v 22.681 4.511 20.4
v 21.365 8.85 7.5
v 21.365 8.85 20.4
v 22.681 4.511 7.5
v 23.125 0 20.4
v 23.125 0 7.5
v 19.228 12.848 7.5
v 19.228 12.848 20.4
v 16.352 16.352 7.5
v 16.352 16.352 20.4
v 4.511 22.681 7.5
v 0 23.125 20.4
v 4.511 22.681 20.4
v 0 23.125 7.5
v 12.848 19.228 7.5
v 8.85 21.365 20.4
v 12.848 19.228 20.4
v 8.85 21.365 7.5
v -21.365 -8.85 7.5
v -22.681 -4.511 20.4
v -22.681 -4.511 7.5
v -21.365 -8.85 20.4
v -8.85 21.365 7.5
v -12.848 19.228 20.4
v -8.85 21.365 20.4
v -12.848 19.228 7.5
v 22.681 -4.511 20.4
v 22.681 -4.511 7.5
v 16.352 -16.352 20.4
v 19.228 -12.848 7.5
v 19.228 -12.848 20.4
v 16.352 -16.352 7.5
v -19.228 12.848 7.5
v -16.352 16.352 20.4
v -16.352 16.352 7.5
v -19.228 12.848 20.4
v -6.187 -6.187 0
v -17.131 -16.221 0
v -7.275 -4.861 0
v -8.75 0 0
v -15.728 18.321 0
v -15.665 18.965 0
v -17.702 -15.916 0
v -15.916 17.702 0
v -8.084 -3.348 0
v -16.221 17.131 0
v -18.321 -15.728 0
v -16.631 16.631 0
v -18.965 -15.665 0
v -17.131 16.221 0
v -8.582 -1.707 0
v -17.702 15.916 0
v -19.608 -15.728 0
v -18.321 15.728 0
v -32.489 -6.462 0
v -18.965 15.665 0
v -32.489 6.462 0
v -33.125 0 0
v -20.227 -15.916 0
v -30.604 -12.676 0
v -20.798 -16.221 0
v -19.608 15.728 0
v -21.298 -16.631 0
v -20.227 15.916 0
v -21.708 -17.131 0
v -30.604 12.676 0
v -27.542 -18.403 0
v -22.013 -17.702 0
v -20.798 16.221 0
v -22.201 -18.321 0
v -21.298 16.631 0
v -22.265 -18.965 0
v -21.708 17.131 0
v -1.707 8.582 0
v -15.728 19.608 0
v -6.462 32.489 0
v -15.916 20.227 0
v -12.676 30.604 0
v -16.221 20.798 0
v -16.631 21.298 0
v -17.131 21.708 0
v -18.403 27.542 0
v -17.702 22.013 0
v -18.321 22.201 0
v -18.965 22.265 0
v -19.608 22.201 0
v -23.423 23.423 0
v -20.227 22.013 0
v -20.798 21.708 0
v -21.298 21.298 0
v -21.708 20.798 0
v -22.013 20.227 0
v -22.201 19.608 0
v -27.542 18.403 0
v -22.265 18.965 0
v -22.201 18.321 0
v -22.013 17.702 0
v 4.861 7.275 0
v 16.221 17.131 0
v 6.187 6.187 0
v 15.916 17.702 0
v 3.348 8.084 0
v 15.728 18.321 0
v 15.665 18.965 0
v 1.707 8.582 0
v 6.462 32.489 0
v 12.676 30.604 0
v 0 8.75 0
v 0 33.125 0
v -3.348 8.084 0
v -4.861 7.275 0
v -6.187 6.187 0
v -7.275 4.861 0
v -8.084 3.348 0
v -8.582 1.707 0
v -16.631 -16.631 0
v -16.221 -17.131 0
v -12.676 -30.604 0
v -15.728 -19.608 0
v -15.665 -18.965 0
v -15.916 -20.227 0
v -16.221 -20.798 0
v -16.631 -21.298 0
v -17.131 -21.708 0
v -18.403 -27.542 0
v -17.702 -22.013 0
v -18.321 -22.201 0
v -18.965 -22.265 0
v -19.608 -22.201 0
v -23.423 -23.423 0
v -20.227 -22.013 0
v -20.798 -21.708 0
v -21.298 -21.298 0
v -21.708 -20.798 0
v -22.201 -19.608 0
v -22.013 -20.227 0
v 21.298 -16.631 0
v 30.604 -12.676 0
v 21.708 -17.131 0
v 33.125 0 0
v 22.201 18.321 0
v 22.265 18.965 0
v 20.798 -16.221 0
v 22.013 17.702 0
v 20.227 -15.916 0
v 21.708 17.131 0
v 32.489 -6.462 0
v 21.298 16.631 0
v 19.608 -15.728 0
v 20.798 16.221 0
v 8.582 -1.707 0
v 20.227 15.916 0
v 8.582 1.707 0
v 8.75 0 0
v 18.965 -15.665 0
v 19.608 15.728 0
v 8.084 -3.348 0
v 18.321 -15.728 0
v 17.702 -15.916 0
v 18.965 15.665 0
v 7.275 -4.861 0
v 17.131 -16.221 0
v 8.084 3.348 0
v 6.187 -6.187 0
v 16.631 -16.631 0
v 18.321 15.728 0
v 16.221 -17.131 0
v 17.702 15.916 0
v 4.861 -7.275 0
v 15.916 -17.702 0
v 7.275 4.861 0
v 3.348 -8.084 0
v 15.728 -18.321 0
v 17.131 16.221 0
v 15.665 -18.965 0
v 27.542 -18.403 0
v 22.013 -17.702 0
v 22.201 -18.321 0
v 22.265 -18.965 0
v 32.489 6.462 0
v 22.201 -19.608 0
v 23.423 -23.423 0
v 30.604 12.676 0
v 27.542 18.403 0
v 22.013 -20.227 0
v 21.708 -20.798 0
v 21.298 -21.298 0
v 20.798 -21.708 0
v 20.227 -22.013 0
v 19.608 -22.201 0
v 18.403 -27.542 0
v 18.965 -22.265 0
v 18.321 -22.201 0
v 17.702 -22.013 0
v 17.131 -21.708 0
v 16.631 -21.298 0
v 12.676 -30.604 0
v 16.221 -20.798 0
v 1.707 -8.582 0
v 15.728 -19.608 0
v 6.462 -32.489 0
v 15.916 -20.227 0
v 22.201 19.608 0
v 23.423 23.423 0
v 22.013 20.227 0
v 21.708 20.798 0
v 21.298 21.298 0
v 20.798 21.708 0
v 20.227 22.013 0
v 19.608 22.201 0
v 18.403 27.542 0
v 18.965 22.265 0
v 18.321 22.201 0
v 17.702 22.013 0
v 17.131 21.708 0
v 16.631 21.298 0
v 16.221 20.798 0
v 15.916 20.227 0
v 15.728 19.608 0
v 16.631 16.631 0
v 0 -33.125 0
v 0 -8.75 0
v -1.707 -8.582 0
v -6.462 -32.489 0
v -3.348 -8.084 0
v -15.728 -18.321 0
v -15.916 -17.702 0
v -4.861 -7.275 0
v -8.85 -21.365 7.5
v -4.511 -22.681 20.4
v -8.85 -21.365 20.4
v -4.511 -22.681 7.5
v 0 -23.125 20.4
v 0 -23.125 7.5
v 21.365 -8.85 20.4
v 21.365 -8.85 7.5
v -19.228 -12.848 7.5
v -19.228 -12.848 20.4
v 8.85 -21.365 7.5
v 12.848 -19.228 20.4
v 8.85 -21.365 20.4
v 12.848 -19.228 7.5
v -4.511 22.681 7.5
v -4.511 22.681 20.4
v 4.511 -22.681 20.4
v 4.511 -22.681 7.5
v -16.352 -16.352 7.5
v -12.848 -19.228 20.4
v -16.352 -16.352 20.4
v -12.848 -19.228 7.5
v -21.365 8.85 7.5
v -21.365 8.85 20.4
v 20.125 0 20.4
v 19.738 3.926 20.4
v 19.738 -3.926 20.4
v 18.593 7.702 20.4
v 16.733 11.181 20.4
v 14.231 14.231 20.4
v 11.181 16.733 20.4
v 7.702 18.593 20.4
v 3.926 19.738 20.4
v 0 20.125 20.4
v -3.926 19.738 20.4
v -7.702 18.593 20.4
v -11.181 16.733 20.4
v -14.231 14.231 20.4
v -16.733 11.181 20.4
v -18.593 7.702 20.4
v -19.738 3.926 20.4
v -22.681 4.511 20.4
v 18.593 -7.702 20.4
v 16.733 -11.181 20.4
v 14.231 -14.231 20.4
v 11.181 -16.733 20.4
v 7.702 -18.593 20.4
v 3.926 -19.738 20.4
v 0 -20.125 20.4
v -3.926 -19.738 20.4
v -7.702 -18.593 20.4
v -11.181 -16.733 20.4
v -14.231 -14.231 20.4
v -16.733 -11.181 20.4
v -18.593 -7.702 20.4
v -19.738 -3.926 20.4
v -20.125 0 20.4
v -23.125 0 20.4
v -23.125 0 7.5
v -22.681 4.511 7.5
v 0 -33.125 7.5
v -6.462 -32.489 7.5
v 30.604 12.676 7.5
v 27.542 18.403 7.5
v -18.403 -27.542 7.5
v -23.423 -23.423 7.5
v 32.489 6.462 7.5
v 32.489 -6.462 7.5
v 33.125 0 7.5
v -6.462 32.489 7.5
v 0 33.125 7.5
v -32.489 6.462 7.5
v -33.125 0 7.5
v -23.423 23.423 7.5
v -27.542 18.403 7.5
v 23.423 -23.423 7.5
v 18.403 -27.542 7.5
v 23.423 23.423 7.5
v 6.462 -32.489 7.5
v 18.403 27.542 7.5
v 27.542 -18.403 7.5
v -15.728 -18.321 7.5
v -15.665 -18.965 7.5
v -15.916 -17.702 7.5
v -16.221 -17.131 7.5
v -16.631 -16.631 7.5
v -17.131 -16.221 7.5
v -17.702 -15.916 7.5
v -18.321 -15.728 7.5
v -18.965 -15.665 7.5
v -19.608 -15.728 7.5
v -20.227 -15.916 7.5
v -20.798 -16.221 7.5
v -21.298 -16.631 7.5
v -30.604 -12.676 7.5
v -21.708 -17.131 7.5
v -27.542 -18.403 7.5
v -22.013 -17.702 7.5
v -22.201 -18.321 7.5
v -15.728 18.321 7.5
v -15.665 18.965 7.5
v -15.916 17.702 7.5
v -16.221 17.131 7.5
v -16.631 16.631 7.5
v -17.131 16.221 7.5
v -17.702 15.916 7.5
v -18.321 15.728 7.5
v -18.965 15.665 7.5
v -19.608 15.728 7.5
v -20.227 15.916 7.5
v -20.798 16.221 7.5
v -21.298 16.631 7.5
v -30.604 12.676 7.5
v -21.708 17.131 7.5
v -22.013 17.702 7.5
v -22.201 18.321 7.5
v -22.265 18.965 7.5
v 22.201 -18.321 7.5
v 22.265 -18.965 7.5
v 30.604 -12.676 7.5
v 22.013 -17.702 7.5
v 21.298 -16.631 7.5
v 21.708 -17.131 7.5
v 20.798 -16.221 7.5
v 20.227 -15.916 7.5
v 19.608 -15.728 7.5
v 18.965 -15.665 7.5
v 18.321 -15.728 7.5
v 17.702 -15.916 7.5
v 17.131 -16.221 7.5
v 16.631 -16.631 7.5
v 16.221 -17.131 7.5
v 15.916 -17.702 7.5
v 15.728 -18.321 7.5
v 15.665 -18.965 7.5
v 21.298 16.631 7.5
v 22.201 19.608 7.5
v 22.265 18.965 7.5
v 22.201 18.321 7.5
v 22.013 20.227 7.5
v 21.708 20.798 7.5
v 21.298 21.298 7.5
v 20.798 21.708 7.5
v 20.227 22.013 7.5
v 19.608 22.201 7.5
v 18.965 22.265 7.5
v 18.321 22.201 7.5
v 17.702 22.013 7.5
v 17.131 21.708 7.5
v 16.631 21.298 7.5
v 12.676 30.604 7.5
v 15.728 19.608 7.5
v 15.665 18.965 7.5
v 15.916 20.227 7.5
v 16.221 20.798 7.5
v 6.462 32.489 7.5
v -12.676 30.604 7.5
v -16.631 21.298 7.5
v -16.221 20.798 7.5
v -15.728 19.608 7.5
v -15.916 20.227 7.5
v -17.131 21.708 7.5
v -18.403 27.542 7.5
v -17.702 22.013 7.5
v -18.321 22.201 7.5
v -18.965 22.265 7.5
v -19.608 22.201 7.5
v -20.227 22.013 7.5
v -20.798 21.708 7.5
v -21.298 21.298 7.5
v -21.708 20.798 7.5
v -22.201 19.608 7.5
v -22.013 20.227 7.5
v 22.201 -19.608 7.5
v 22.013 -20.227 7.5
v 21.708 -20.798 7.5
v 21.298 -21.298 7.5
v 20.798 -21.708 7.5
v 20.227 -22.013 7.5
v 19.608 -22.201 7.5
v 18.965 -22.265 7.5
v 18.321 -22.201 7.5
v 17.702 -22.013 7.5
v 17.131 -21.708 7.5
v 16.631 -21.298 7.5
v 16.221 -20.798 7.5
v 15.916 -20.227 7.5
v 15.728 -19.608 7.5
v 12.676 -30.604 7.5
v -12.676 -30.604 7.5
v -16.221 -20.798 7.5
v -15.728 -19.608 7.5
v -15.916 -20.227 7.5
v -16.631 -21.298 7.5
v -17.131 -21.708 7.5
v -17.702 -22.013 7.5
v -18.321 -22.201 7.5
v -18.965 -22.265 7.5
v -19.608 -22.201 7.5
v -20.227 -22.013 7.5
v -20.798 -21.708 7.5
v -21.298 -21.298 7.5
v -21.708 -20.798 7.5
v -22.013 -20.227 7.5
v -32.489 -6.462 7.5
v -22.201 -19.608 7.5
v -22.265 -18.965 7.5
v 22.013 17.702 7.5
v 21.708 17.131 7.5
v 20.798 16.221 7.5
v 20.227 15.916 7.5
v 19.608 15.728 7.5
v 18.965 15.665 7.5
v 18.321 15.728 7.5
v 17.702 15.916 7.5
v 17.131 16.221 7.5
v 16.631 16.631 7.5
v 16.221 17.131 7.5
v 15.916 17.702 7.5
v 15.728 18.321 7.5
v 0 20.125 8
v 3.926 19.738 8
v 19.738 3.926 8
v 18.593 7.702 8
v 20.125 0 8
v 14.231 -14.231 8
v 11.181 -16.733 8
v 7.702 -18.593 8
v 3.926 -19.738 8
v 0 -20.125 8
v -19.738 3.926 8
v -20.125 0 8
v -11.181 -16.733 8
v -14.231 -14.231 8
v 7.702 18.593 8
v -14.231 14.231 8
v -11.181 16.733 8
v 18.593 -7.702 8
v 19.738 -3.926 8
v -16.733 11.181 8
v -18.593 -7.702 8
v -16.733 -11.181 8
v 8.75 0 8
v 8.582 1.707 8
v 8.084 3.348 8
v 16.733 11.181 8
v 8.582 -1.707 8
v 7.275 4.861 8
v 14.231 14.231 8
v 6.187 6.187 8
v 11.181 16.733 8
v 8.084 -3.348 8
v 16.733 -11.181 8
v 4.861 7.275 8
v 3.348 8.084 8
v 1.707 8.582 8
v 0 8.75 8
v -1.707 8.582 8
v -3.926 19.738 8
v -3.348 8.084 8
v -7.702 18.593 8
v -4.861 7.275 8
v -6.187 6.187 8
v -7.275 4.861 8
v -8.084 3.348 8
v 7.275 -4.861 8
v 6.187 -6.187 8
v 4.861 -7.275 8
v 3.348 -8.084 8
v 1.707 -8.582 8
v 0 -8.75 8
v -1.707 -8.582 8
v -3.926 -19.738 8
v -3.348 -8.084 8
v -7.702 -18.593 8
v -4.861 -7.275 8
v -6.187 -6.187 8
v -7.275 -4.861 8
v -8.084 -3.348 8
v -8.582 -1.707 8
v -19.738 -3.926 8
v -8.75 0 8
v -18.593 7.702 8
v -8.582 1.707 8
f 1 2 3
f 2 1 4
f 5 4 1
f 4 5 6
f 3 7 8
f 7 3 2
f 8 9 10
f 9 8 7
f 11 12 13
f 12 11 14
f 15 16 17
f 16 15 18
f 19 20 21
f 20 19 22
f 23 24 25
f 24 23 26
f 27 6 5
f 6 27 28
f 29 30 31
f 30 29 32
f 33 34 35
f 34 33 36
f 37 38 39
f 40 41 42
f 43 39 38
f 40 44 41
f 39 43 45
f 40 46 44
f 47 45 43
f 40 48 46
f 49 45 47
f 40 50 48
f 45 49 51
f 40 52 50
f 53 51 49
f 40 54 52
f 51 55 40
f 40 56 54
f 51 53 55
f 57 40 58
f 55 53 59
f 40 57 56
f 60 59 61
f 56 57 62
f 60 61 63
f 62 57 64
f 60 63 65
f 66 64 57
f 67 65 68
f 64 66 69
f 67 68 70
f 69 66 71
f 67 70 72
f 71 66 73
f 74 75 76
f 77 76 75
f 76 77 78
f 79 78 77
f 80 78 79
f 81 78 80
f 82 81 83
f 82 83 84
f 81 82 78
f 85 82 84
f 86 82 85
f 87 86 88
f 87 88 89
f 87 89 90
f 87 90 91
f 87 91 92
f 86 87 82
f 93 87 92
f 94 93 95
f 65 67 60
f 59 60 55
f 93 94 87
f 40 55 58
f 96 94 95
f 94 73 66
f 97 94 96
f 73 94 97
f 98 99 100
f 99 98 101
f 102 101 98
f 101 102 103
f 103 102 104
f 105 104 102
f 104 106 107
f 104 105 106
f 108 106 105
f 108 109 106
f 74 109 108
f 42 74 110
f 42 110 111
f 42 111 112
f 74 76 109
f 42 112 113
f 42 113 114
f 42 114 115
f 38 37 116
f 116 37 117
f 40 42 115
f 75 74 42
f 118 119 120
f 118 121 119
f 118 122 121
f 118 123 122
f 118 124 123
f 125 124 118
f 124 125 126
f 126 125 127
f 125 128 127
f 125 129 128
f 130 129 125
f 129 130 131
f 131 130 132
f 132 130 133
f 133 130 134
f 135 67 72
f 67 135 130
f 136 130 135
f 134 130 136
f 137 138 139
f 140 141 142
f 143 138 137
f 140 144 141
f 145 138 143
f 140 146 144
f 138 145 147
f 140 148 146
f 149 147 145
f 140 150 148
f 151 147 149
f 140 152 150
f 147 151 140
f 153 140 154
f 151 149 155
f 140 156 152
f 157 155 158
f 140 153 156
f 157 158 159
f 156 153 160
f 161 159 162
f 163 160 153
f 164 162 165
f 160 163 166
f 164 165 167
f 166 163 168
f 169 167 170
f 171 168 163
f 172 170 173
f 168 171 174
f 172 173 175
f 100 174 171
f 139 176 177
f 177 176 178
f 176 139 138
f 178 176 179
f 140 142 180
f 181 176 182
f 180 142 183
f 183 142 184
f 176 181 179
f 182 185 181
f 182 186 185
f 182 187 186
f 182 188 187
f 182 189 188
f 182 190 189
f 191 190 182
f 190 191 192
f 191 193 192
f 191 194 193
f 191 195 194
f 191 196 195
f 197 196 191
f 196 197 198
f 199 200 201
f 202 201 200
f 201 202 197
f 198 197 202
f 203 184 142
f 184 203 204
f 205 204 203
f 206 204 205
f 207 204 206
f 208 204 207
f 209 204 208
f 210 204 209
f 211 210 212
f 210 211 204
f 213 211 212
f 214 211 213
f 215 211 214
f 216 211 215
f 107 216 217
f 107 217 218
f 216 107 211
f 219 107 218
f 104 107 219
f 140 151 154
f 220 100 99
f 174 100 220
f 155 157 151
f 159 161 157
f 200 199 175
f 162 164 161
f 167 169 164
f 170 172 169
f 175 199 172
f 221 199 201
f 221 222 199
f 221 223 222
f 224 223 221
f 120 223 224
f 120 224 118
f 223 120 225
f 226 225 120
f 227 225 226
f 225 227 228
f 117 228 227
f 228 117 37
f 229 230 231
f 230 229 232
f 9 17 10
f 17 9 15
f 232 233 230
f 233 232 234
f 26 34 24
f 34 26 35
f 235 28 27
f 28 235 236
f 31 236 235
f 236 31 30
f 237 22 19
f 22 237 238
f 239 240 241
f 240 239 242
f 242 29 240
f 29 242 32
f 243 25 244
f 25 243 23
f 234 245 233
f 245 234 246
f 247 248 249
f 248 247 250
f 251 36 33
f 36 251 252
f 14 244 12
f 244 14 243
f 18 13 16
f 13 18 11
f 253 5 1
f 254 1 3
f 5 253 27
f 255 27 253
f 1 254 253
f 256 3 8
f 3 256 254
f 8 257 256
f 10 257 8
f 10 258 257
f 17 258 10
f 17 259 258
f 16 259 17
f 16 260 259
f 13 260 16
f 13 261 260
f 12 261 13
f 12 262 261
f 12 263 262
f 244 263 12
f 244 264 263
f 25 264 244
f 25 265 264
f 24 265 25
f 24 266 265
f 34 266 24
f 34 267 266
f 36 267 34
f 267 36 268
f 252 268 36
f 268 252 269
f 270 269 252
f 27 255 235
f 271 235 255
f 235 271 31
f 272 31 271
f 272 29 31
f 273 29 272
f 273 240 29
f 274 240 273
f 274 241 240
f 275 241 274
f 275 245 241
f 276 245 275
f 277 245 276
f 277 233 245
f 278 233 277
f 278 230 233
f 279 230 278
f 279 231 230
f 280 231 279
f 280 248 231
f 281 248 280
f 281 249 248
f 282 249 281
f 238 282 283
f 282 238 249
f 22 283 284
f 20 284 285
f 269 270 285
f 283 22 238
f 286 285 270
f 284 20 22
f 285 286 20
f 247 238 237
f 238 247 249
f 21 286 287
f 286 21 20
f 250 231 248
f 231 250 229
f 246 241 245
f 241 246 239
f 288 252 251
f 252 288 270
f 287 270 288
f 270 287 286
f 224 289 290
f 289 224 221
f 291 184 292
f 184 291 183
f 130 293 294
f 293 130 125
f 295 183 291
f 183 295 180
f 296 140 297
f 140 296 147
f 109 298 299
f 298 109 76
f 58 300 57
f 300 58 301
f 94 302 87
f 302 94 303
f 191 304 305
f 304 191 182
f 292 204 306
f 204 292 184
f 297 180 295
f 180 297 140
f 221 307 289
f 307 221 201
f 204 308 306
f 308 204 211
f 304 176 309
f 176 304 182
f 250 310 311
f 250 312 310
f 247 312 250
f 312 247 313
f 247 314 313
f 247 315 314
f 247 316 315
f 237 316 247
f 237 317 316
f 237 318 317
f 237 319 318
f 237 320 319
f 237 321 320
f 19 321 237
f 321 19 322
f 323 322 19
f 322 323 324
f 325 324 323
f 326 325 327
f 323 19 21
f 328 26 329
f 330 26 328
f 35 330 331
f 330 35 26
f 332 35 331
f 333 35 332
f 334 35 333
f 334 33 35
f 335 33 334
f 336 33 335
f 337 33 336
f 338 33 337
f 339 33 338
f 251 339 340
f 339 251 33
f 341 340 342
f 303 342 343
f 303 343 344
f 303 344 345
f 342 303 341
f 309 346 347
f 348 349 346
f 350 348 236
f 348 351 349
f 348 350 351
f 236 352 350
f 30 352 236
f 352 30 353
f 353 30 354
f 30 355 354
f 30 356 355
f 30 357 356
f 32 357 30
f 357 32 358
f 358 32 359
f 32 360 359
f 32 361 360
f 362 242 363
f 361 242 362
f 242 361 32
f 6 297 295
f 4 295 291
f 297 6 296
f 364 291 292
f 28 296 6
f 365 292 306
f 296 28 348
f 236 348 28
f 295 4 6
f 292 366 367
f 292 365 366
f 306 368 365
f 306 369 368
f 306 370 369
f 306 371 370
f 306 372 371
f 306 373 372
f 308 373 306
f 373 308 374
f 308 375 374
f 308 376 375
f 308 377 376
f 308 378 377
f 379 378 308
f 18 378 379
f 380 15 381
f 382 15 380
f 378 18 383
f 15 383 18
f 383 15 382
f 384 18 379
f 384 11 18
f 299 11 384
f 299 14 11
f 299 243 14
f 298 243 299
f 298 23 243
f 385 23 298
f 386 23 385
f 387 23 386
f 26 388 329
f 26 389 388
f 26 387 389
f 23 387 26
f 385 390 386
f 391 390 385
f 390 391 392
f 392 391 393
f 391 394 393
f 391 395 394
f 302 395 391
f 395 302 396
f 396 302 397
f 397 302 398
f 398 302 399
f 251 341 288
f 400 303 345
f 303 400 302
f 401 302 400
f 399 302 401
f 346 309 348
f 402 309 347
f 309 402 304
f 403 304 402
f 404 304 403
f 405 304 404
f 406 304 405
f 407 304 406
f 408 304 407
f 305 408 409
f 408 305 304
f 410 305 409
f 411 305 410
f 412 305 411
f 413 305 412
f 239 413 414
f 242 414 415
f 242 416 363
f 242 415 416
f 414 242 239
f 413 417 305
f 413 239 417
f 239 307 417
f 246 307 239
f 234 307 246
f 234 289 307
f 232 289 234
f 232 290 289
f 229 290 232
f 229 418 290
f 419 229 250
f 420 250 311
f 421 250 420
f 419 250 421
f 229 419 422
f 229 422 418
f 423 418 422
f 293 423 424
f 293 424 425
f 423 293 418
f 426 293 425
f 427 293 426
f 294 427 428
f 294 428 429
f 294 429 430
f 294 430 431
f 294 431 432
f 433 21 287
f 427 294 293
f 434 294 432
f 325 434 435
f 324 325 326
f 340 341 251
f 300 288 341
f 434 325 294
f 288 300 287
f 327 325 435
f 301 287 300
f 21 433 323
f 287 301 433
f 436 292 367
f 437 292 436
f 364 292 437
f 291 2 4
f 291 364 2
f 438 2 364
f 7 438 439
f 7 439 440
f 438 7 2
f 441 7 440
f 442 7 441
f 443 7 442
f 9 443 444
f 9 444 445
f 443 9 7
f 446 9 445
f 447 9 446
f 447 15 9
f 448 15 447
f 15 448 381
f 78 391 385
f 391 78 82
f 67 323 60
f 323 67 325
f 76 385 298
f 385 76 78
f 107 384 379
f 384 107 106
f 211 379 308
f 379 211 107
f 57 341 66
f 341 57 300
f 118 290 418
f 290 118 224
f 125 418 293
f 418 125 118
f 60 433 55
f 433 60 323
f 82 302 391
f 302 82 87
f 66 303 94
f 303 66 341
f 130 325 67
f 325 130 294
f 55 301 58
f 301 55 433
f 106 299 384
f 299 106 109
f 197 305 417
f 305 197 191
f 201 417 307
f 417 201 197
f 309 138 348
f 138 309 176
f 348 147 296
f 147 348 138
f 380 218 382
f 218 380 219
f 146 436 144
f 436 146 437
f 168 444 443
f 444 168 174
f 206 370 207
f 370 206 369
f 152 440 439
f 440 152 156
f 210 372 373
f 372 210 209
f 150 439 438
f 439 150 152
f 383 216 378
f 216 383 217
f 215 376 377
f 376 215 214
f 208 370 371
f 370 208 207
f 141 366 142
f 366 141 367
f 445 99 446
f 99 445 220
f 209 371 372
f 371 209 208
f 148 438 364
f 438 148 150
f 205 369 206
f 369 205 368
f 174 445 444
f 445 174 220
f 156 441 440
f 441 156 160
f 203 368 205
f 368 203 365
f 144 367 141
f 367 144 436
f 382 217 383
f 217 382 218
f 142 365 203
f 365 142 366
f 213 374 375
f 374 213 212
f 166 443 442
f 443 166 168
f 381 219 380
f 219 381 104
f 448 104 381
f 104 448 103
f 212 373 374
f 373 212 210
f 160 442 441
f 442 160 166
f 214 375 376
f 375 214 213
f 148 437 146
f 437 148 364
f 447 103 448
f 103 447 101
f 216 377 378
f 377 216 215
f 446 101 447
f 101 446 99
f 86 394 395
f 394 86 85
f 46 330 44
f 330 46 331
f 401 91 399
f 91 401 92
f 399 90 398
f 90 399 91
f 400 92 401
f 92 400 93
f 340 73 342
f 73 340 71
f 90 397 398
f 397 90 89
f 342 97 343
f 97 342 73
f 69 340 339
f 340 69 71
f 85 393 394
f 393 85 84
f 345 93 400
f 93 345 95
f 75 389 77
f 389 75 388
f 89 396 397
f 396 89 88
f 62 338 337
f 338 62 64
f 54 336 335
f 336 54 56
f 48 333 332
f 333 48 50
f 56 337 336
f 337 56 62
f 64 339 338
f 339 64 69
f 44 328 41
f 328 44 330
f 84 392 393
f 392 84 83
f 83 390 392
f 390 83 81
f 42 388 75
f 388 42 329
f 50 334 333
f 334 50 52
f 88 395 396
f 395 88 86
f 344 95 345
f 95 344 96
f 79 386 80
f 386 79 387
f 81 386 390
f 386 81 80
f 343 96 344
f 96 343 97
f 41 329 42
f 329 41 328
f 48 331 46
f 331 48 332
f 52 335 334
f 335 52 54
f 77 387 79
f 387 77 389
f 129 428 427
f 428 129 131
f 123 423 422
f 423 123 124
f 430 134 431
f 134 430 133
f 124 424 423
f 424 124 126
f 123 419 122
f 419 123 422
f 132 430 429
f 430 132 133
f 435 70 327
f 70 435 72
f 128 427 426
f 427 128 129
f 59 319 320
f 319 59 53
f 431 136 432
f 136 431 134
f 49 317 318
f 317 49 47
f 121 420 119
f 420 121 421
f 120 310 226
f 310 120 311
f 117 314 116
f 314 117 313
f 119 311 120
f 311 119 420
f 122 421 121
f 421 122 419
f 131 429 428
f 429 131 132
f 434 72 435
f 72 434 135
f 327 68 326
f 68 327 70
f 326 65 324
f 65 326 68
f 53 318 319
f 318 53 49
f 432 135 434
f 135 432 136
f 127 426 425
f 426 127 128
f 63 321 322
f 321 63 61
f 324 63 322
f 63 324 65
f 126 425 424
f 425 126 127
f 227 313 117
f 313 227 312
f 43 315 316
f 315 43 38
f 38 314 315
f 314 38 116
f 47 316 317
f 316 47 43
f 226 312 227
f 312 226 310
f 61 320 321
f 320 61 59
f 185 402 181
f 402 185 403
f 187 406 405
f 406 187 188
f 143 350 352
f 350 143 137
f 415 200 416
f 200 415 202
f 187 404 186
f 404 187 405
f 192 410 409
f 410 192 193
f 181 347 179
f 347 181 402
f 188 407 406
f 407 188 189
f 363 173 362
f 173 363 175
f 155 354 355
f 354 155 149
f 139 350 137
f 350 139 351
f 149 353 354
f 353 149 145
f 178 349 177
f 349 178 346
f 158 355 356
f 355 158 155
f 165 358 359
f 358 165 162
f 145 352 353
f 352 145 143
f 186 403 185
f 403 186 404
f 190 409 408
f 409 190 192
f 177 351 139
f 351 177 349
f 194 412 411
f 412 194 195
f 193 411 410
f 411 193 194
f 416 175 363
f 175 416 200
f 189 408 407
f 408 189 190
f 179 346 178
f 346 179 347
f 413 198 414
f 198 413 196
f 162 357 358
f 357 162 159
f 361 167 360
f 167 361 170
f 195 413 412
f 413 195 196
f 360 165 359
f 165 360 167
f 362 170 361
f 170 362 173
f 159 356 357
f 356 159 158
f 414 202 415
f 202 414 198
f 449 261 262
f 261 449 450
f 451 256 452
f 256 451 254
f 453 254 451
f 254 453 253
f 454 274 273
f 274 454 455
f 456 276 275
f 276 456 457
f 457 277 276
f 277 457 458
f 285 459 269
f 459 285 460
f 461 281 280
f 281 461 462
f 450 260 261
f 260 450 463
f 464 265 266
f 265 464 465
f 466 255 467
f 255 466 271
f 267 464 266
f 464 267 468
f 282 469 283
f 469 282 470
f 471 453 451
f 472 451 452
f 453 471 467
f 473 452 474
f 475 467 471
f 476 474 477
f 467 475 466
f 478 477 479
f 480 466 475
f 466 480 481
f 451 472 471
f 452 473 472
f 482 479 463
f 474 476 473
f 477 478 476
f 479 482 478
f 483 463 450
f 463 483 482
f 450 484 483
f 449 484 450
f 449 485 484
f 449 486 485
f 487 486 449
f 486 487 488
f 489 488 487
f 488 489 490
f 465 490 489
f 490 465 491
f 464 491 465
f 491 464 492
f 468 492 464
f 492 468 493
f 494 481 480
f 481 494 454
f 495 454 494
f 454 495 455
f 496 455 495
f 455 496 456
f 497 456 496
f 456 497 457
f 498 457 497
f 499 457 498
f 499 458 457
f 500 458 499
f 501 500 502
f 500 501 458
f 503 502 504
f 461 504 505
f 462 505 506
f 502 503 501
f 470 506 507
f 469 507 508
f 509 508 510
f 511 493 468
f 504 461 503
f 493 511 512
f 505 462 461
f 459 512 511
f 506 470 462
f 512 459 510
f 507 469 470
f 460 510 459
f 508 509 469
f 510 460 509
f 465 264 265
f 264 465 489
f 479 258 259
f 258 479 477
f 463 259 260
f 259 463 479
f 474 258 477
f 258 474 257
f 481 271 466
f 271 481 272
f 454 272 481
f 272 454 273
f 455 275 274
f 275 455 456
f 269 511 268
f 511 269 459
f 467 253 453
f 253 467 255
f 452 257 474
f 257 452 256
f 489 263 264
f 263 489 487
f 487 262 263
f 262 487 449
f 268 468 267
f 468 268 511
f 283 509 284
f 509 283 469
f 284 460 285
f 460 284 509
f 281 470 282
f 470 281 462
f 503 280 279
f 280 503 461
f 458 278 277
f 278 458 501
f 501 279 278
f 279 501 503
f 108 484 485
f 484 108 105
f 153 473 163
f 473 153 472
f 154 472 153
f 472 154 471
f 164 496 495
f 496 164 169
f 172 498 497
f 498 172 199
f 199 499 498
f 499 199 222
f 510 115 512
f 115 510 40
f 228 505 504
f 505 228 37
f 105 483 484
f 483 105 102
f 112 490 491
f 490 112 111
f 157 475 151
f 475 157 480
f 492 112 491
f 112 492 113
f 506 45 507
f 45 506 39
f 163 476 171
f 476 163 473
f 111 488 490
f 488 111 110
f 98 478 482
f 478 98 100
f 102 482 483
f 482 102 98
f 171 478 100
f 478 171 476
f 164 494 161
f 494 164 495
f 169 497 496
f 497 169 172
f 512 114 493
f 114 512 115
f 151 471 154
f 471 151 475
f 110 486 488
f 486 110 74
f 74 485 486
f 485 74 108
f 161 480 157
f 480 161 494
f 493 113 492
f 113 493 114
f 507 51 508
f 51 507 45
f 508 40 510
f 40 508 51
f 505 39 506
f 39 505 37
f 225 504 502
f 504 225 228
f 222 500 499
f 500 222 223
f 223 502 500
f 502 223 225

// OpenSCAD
$fn = 32;

// ----------------------------------------------------------------------
// Bearing housing: seat for 6203 (40 x 12 mm), 46.25 mm body
// ----------------------------------------------------------------------

// --- parameters (mm) ---
case_d = 46.25;           // housing outside diameter
case_h = 20.4;            // overall housing height
rim_t = 3;                // wall thickness
bearing_seat = 40.25;     // 6203 seat, 0.25 mm clearance
seat_h = 12.4;            // pocket depth
shoulder = 2;             // shoulder under the bearing
pass_d = 17.5;            // shaft passage
ear_d = 66.25;            // mounting flange diameter
flange_t = 6;             // flange thickness
bolt_d = 6.6;             // flange bolt clearance
bolt_r = 26.82;           // flange bolt circle radius

module body() {
  cylinder(h = case_h, d = case_d);
}

module flange() {
  /* flange sunk 1.5 mm into the body */
  cylinder(h = flange_t + 1.5, d = ear_d);
}

difference() {
  union() {
    body();
    flange();
  }
  translate([0, 0, case_h - seat_h]) cylinder(h = seat_h + 1, d = bearing_seat);
  translate([0, 0, -1]) cylinder(h = case_h - seat_h + 1, d = pass_d);
  for (i = [0 : 3]) rotate([0, 0, 45 + i * 90]) translate([bolt_r, 0, -1])
    cylinder(h = flange_t + 3, d = bolt_d);
}
